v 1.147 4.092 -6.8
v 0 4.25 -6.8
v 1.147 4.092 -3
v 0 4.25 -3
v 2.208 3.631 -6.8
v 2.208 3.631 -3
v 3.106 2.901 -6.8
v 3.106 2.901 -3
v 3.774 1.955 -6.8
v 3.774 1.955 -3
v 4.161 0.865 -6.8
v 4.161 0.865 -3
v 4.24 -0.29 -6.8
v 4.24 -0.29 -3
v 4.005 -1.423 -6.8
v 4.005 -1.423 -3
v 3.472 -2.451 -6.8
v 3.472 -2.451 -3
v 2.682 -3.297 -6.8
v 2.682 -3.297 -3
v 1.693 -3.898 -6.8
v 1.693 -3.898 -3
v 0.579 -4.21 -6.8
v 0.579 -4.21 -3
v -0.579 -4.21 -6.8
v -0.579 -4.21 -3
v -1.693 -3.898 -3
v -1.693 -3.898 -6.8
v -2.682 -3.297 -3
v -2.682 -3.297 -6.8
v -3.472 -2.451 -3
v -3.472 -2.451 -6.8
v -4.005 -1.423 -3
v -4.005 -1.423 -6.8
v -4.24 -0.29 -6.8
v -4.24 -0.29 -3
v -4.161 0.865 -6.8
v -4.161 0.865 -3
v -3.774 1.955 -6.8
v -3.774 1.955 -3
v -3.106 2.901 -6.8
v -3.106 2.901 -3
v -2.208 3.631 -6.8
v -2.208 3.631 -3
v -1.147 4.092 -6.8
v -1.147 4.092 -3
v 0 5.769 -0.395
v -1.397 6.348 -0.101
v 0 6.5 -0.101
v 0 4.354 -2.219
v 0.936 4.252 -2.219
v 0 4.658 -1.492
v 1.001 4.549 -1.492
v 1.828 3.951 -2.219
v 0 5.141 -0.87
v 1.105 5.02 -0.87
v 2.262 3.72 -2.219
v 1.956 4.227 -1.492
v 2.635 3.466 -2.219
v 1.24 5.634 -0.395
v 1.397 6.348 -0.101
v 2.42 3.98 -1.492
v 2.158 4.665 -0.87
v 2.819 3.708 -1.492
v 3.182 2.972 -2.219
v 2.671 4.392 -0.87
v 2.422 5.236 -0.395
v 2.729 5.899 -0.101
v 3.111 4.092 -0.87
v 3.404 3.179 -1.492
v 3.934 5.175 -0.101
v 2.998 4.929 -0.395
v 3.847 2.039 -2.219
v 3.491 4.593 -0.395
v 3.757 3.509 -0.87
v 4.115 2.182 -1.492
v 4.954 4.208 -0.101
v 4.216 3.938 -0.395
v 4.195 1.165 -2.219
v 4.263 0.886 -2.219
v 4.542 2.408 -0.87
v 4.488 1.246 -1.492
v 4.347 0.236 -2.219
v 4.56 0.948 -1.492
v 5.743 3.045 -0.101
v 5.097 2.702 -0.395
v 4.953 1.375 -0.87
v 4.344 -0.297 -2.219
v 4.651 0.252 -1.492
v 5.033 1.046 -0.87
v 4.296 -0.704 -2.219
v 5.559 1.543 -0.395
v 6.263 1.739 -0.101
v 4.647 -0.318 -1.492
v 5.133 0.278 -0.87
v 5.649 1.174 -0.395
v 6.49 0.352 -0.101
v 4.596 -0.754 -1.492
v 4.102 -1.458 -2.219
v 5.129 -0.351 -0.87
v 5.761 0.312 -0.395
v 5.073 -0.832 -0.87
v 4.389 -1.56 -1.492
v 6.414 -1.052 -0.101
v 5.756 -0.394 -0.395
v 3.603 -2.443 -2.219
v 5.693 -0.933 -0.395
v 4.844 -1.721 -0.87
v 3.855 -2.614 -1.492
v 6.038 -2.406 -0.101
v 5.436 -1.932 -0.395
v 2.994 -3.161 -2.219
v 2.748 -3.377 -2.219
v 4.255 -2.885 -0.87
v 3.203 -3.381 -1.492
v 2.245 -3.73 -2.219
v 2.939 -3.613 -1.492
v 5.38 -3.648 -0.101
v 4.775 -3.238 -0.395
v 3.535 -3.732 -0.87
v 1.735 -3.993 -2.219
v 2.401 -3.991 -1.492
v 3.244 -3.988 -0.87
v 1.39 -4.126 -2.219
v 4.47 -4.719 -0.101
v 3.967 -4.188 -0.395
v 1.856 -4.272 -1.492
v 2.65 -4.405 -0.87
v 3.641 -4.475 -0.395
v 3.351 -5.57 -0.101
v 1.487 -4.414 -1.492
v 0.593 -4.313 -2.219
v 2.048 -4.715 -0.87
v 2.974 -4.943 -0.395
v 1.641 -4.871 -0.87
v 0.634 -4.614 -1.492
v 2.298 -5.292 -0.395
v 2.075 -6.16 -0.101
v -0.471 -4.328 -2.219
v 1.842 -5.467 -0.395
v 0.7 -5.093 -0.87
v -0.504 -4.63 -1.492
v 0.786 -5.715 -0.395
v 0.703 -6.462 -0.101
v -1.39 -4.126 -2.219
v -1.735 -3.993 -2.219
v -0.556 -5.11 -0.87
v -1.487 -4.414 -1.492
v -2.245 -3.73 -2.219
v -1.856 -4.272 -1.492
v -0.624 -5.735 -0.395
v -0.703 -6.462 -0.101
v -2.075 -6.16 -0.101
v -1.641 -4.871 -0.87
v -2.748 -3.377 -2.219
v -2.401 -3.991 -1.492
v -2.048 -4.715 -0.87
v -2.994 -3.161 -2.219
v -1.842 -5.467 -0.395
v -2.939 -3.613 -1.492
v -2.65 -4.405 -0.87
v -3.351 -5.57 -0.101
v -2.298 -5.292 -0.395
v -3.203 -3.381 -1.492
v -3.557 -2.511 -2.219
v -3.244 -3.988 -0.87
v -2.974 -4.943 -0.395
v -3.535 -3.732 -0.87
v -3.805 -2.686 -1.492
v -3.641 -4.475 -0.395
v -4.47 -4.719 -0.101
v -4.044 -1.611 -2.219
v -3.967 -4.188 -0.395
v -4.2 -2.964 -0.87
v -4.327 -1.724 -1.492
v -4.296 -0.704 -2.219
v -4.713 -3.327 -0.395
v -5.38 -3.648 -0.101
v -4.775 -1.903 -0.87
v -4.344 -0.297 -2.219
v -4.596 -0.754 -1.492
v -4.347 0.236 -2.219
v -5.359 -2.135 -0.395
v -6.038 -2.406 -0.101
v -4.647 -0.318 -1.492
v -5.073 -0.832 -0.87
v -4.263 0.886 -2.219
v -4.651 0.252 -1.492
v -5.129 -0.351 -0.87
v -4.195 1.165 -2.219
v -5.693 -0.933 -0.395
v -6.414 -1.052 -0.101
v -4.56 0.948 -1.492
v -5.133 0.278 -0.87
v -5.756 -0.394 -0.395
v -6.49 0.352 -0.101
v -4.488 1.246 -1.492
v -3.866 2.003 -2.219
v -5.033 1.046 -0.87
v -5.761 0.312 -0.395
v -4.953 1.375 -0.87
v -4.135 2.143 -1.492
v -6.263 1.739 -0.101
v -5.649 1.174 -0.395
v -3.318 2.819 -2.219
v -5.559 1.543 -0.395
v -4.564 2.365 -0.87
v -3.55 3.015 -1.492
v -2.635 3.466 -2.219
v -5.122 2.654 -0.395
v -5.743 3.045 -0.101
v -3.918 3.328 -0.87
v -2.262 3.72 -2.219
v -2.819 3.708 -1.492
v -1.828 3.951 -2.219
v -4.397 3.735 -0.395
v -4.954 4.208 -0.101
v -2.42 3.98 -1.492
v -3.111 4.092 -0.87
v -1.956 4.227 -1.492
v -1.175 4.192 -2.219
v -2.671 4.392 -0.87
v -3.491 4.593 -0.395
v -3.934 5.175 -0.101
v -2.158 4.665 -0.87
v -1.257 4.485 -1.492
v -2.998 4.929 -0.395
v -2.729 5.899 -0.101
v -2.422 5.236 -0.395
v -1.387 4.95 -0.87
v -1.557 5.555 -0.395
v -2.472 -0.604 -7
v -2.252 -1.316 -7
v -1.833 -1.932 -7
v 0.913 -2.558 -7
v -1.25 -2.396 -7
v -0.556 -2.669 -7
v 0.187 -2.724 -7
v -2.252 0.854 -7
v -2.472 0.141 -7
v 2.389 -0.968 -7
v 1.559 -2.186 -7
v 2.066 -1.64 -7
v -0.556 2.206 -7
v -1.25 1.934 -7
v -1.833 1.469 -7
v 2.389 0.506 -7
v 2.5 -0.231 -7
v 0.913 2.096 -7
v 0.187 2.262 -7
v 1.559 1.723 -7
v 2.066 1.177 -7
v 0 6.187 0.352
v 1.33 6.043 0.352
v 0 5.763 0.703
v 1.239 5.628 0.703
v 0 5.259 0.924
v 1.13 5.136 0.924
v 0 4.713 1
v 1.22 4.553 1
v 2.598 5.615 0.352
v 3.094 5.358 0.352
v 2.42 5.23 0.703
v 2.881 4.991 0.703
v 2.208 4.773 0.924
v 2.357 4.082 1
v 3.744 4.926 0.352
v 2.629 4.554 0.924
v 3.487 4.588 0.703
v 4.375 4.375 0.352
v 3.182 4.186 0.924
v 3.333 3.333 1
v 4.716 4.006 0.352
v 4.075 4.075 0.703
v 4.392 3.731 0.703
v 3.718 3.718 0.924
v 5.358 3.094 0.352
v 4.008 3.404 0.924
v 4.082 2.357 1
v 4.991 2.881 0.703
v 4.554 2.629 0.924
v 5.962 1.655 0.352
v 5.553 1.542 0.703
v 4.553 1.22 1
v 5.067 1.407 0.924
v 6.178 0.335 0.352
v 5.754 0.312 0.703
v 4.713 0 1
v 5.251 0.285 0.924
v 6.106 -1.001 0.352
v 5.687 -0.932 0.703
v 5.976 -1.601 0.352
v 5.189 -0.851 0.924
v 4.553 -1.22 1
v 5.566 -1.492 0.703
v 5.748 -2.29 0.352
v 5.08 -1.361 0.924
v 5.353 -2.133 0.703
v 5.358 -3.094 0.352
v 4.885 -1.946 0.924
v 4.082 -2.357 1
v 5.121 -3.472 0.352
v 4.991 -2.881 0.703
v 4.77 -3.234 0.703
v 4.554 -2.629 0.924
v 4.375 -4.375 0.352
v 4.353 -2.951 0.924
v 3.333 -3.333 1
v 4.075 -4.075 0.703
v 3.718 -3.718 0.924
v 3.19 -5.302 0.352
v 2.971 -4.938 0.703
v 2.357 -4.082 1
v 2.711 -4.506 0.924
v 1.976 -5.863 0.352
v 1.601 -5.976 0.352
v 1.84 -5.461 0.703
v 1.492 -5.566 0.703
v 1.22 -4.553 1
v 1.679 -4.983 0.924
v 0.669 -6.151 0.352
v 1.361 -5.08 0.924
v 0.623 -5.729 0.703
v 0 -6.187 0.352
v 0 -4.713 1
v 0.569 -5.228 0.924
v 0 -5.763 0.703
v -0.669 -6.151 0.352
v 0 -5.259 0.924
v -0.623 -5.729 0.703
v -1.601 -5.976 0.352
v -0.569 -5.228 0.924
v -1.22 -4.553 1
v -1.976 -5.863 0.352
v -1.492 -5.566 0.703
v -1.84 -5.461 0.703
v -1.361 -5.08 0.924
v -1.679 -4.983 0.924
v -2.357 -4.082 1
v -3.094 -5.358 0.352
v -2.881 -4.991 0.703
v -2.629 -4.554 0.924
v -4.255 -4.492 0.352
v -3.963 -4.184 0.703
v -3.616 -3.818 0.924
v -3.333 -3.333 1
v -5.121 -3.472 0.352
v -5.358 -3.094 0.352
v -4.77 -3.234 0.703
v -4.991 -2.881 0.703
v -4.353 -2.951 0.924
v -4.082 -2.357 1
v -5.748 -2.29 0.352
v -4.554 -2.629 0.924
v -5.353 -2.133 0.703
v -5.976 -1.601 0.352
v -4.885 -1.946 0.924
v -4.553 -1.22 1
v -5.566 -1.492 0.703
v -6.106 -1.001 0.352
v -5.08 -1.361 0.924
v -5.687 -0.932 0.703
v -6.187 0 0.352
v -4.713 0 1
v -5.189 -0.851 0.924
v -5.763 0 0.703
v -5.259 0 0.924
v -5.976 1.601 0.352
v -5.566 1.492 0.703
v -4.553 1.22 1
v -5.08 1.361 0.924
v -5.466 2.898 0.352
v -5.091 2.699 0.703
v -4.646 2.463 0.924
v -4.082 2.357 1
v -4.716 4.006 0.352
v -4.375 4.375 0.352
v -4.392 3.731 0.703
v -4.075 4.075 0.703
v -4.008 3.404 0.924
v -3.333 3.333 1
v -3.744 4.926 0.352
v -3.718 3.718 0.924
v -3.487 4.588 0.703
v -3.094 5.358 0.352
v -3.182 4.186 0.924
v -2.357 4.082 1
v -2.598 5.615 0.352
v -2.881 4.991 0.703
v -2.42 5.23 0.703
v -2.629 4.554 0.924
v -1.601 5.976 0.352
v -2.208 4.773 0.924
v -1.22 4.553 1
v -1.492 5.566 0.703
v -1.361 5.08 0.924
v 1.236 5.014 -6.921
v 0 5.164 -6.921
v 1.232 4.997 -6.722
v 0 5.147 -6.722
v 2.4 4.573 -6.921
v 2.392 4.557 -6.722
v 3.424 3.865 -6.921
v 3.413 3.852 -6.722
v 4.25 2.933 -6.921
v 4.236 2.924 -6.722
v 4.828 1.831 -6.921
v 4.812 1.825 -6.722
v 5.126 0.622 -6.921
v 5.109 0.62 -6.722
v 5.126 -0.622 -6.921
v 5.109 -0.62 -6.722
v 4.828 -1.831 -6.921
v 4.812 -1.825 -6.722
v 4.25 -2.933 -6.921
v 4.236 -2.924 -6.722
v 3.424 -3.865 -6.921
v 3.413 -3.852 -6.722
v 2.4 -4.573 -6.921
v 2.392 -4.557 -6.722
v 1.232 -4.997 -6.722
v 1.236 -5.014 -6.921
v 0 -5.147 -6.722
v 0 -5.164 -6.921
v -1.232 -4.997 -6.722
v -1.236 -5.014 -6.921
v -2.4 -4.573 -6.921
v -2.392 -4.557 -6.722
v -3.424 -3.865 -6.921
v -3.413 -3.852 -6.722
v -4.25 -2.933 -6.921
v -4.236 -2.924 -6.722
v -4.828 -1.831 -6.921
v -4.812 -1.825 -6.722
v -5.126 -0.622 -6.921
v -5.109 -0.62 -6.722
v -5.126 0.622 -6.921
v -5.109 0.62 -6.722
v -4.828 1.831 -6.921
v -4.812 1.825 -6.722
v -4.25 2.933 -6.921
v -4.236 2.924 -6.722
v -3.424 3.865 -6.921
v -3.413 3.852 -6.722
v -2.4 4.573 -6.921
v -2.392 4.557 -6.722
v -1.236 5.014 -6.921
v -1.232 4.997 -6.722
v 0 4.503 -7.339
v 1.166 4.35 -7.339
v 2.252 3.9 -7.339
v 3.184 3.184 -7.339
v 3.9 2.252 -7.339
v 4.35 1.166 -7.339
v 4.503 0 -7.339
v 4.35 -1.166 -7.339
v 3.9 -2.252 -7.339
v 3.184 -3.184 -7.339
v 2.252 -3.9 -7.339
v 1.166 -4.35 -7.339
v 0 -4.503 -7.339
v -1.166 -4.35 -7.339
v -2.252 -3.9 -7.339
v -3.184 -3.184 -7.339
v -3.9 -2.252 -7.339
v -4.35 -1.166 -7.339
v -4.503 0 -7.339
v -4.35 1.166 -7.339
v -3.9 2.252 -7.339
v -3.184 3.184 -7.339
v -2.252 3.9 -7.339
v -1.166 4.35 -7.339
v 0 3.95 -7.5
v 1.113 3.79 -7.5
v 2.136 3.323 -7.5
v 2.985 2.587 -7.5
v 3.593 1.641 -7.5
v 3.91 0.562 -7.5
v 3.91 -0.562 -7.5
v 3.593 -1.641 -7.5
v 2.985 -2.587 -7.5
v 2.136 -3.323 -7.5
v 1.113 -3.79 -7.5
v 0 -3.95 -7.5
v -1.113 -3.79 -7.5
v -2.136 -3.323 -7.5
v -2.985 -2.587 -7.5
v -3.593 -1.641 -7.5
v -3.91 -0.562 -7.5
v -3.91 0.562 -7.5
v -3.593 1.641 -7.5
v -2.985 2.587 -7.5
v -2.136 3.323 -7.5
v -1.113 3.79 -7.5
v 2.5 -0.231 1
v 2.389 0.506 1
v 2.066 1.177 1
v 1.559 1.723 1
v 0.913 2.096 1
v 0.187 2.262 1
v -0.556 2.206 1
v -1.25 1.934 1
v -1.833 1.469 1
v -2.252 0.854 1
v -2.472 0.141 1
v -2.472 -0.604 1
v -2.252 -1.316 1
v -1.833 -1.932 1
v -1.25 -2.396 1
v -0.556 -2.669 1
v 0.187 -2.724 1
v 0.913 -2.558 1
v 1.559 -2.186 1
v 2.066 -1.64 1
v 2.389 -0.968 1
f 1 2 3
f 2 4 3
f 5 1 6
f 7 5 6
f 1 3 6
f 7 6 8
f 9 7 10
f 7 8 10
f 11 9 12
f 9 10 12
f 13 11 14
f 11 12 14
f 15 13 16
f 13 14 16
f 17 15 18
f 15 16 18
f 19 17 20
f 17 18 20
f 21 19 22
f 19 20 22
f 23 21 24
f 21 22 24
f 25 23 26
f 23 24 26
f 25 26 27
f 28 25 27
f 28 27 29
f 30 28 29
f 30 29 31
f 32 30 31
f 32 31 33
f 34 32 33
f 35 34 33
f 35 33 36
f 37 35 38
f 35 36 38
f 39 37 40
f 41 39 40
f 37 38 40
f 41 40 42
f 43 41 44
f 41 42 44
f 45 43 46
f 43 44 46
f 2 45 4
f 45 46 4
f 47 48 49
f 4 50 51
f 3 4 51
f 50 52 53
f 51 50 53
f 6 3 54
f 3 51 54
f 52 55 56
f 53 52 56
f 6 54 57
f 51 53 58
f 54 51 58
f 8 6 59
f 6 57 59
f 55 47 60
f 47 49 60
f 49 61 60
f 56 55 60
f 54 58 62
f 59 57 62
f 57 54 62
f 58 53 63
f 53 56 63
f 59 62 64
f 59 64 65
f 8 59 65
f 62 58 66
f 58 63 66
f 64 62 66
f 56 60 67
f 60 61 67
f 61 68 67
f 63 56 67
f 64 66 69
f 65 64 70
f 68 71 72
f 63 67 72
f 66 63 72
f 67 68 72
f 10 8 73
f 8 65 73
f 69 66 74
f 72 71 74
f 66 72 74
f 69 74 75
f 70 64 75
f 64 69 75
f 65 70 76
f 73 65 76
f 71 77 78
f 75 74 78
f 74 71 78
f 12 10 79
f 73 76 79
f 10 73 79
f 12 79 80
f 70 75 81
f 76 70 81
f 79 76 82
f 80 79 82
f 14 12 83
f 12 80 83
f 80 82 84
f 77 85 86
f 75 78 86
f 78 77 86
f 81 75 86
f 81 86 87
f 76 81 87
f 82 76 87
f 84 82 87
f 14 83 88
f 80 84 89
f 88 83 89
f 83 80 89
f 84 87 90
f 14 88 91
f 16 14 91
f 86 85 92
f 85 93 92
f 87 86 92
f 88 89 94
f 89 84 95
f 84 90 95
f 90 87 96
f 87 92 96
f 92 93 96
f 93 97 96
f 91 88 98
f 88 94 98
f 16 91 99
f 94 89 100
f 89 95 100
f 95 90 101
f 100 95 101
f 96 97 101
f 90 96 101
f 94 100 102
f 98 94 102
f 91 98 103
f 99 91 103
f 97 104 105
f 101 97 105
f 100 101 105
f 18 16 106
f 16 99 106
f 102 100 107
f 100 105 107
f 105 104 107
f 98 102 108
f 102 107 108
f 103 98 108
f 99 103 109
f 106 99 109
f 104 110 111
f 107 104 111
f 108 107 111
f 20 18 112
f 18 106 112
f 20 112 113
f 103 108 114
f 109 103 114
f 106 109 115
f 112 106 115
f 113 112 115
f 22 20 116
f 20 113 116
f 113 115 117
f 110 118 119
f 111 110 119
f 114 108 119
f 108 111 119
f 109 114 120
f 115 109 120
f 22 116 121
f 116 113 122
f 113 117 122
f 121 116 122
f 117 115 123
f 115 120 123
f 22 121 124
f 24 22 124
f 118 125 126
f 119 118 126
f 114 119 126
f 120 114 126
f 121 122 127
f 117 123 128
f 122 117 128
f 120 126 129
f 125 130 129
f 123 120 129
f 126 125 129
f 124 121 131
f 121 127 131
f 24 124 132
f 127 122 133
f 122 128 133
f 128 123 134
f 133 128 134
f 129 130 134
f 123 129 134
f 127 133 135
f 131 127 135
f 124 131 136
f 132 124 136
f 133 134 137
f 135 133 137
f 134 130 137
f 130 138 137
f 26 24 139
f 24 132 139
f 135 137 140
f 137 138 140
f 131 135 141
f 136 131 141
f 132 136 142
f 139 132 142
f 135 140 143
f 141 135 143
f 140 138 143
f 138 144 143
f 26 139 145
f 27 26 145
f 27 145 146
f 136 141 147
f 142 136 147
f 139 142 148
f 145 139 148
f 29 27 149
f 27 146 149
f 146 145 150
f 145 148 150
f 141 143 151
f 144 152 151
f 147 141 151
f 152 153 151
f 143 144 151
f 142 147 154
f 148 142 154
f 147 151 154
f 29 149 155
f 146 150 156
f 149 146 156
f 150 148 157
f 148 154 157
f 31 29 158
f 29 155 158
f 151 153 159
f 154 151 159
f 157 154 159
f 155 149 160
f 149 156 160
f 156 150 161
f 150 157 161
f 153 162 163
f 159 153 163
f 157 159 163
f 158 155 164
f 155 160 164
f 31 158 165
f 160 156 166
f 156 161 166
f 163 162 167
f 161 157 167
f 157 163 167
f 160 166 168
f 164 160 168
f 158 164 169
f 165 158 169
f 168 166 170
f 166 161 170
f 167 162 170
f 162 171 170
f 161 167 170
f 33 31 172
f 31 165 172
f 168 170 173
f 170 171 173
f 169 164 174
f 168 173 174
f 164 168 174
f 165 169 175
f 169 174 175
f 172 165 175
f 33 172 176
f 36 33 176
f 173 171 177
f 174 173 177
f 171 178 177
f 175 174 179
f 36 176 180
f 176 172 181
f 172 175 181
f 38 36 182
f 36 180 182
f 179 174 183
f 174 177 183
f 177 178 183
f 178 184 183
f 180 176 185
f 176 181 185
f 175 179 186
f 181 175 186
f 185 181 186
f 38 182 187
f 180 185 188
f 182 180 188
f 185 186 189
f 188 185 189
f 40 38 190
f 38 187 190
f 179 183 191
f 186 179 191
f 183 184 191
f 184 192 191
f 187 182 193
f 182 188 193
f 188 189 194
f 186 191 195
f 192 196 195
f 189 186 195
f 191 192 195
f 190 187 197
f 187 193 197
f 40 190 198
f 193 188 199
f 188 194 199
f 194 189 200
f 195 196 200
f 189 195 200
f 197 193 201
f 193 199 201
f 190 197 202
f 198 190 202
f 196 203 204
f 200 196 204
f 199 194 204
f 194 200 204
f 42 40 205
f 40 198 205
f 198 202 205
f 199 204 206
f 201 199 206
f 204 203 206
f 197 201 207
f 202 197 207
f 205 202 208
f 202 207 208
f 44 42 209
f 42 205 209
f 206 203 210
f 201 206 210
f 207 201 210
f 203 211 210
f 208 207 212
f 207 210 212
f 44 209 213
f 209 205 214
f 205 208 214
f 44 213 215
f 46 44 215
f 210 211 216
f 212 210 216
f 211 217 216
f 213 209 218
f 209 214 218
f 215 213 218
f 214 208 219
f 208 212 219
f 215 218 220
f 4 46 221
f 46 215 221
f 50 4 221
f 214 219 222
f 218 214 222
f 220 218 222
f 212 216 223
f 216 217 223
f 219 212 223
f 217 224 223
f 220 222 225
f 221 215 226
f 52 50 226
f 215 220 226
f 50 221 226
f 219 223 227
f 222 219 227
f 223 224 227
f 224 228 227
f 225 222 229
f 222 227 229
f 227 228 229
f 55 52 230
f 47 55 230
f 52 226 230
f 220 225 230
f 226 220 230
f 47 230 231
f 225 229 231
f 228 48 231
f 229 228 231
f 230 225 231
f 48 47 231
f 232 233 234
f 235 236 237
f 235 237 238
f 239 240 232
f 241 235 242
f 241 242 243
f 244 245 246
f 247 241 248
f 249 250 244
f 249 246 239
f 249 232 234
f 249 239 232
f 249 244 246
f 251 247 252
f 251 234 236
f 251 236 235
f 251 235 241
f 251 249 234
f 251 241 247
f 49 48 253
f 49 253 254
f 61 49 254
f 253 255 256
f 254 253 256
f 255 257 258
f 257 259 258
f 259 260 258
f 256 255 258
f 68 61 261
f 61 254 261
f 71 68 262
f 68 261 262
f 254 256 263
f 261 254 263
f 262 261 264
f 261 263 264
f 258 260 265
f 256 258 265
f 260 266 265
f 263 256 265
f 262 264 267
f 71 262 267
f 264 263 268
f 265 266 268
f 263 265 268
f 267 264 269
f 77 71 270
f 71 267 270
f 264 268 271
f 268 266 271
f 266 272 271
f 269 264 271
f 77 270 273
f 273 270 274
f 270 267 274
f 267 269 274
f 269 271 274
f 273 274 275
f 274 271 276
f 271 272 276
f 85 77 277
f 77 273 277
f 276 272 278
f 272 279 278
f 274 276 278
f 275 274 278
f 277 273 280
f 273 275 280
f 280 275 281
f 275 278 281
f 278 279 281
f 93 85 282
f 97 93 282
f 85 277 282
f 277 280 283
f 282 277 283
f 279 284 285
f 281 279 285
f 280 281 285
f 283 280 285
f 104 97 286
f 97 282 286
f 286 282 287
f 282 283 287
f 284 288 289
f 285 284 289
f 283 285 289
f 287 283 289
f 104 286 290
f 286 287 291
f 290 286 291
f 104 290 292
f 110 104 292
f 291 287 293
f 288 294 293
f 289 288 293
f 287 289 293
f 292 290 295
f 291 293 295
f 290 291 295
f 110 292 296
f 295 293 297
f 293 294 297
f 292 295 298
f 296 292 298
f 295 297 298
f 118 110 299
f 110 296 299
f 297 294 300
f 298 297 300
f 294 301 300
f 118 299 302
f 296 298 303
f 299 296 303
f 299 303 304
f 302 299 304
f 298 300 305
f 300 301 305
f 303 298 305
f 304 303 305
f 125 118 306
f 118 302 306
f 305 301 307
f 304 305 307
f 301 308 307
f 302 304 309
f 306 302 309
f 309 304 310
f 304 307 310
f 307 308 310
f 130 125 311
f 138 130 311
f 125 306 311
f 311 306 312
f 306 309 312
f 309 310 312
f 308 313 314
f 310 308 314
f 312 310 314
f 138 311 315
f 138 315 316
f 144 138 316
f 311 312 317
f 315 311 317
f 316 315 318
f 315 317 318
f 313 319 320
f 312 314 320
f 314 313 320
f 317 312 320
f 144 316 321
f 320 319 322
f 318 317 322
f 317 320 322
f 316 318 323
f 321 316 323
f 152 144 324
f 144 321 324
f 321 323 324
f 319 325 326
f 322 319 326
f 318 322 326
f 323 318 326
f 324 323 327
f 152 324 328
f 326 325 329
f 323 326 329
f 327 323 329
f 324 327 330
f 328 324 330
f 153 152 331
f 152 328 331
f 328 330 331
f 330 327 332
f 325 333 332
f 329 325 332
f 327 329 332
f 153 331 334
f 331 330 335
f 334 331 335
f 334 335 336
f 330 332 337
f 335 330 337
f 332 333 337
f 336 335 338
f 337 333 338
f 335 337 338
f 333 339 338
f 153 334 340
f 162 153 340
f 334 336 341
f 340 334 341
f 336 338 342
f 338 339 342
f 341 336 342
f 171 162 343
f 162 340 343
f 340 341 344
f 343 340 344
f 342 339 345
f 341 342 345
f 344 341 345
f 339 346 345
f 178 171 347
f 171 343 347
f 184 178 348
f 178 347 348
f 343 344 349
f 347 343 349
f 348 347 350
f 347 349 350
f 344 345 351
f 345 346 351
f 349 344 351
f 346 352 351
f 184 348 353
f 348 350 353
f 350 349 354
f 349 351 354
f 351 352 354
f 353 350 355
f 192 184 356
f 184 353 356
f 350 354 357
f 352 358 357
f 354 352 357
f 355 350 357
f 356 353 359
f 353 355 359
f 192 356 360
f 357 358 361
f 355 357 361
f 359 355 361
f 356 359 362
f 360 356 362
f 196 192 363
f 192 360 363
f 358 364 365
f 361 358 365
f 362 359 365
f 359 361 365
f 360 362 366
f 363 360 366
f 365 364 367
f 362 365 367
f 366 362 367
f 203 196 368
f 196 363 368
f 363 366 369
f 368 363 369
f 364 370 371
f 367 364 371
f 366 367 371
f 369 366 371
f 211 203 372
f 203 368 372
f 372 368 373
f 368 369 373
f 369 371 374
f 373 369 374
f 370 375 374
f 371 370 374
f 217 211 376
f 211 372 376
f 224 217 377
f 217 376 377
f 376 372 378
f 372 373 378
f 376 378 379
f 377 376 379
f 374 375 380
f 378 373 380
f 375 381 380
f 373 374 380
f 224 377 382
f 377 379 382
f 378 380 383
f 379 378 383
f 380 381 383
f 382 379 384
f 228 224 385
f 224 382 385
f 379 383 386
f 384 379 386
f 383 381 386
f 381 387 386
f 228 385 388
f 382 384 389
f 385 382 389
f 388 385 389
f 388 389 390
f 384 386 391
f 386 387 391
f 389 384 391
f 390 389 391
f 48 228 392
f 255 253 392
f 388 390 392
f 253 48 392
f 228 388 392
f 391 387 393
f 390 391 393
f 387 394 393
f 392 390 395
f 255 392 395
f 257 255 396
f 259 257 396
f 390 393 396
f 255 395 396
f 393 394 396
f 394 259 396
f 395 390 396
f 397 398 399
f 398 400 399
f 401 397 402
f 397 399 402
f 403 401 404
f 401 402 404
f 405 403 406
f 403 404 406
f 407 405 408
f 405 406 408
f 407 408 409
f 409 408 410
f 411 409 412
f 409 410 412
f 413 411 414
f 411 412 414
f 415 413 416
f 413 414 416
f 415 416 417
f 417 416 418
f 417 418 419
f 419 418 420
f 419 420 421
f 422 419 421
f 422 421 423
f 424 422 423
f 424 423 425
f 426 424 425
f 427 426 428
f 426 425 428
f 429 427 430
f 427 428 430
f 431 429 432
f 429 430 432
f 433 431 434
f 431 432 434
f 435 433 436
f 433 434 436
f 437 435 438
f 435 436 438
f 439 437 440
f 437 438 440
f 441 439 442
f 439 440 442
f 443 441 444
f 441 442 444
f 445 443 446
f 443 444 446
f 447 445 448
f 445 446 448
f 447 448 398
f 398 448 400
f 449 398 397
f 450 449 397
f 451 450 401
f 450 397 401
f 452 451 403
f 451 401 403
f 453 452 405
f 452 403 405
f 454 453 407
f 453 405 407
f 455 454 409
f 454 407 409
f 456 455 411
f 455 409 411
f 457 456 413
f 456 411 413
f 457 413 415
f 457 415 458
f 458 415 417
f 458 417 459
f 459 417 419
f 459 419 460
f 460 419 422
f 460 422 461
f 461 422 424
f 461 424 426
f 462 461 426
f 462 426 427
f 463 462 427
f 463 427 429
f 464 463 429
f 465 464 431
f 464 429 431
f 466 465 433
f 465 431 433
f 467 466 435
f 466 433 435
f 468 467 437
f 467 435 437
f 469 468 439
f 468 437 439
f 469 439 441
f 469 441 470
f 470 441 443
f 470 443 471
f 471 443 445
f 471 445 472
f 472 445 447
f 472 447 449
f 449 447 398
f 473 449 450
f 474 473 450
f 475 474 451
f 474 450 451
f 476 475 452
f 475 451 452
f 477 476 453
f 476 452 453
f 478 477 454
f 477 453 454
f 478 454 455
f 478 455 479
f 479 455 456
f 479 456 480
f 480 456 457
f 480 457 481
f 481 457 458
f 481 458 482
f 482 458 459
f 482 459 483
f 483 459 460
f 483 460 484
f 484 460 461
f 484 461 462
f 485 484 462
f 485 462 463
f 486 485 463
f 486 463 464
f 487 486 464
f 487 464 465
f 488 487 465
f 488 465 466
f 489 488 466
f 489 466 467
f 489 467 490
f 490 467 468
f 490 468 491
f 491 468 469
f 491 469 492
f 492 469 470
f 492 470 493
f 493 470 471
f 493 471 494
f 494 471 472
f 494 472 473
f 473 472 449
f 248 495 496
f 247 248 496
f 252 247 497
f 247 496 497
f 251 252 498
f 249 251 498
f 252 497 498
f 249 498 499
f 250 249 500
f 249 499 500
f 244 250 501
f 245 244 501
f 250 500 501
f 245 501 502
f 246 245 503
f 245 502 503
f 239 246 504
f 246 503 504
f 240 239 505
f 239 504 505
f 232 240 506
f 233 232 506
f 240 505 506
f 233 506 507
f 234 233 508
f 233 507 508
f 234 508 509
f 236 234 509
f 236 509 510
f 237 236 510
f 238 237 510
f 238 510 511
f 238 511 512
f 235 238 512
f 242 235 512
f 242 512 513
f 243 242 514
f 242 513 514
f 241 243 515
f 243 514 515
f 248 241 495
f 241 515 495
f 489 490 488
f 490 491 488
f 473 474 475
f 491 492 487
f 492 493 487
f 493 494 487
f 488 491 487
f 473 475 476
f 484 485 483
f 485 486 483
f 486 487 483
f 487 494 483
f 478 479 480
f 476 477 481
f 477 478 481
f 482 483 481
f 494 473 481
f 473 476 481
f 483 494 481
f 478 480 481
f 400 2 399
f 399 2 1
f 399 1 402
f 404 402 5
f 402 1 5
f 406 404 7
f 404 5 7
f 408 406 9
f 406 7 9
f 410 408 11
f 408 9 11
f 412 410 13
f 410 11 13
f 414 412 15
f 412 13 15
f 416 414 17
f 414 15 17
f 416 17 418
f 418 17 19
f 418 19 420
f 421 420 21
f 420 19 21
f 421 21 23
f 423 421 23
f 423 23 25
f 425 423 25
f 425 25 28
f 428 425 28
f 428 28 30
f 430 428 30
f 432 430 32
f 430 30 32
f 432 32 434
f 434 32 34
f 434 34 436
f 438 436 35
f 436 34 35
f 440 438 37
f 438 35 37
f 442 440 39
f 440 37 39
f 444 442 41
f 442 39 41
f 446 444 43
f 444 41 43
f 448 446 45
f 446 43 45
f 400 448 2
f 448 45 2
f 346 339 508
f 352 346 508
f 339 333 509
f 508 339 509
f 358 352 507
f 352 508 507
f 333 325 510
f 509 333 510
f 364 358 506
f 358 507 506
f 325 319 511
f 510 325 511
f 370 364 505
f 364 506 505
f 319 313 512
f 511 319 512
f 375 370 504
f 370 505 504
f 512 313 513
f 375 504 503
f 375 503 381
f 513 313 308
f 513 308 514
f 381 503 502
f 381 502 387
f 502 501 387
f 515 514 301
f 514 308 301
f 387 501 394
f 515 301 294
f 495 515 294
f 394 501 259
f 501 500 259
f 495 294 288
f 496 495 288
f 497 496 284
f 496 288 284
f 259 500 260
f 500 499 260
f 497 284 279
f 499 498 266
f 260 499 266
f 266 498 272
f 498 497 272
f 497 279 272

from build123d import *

# Parameters (mm, degrees)
F2_SIZE  = 0.3
F4_R     = 2.5
F5_DEPTH = 8


# Not quite as in the source:
# - a fillet or chamfer that OpenCascade refuses, or shapes differently, is made with other operations: its cross-section is extruded or revolved along the edge and cut away or added


with BuildPart() as f1:
    # F0 (on Right) → F1 (revolve)
    with BuildSketch(Plane.YZ):
        with BuildLine():
            Line((4.25, -6.8), (4.25, -3))
            ThreePointArc((4.25, -3), (4.878497412, -1.1651468819), (6.5, -0.1009926077))
            Line((6.5, -0.1009926077), (6.5, 1))
            Line((6.5, 1), (0, 1))
            Line((0, 1), (0, 0))
            Line((0, 0), (0, -7.5))
            Line((0, -7.5), (4.25, -7.5))
            Line((4.25, -7.5), (5.1640063768, -6.9207987711))
            Line((5.1640063768, -6.9207987711), (5.1465752283, -6.7215598315))
            Line((5.1465752283, -6.7215598315), (4.25, -6.8))
        make_face()
    revolve(axis=Axis((0, 0, -3.75), (0, 0, -1)))

    # F2
    f2_edges = [f1.edges().sort_by_distance(p)[0] for p in [
        (0, -4.25, -7.5),
    ]]
    chamfer(f2_edges, length=F2_SIZE)

    # F3: fillet of radius 2 on 1 edges, made by hand

    # F3_s1 → F3_t2 (revolve, cut)
    with BuildSketch(Plane.YZ):
        with BuildLine():
            ThreePointArc((6.5, -0.1009926077), (5.7627250062, 0.702647172), (4.7134430575, 1))
            Line((4.7134430575, 1), (6.5, 1))
            Line((6.5, 1), (6.5, -0.1009926077))
        make_face()
    revolve(axis=Axis((0, 0, 1), (0, 0, -1)), mode=Mode.SUBTRACT)

    # F4 (on face) → F5 (cut)
    with BuildSketch(Plane.XY.offset(1)):
        with Locations((0, -0.2312049229)):
            Circle(F4_R)
    extrude(amount=-F5_DEPTH, mode=Mode.SUBTRACT)


solid = f1.part
